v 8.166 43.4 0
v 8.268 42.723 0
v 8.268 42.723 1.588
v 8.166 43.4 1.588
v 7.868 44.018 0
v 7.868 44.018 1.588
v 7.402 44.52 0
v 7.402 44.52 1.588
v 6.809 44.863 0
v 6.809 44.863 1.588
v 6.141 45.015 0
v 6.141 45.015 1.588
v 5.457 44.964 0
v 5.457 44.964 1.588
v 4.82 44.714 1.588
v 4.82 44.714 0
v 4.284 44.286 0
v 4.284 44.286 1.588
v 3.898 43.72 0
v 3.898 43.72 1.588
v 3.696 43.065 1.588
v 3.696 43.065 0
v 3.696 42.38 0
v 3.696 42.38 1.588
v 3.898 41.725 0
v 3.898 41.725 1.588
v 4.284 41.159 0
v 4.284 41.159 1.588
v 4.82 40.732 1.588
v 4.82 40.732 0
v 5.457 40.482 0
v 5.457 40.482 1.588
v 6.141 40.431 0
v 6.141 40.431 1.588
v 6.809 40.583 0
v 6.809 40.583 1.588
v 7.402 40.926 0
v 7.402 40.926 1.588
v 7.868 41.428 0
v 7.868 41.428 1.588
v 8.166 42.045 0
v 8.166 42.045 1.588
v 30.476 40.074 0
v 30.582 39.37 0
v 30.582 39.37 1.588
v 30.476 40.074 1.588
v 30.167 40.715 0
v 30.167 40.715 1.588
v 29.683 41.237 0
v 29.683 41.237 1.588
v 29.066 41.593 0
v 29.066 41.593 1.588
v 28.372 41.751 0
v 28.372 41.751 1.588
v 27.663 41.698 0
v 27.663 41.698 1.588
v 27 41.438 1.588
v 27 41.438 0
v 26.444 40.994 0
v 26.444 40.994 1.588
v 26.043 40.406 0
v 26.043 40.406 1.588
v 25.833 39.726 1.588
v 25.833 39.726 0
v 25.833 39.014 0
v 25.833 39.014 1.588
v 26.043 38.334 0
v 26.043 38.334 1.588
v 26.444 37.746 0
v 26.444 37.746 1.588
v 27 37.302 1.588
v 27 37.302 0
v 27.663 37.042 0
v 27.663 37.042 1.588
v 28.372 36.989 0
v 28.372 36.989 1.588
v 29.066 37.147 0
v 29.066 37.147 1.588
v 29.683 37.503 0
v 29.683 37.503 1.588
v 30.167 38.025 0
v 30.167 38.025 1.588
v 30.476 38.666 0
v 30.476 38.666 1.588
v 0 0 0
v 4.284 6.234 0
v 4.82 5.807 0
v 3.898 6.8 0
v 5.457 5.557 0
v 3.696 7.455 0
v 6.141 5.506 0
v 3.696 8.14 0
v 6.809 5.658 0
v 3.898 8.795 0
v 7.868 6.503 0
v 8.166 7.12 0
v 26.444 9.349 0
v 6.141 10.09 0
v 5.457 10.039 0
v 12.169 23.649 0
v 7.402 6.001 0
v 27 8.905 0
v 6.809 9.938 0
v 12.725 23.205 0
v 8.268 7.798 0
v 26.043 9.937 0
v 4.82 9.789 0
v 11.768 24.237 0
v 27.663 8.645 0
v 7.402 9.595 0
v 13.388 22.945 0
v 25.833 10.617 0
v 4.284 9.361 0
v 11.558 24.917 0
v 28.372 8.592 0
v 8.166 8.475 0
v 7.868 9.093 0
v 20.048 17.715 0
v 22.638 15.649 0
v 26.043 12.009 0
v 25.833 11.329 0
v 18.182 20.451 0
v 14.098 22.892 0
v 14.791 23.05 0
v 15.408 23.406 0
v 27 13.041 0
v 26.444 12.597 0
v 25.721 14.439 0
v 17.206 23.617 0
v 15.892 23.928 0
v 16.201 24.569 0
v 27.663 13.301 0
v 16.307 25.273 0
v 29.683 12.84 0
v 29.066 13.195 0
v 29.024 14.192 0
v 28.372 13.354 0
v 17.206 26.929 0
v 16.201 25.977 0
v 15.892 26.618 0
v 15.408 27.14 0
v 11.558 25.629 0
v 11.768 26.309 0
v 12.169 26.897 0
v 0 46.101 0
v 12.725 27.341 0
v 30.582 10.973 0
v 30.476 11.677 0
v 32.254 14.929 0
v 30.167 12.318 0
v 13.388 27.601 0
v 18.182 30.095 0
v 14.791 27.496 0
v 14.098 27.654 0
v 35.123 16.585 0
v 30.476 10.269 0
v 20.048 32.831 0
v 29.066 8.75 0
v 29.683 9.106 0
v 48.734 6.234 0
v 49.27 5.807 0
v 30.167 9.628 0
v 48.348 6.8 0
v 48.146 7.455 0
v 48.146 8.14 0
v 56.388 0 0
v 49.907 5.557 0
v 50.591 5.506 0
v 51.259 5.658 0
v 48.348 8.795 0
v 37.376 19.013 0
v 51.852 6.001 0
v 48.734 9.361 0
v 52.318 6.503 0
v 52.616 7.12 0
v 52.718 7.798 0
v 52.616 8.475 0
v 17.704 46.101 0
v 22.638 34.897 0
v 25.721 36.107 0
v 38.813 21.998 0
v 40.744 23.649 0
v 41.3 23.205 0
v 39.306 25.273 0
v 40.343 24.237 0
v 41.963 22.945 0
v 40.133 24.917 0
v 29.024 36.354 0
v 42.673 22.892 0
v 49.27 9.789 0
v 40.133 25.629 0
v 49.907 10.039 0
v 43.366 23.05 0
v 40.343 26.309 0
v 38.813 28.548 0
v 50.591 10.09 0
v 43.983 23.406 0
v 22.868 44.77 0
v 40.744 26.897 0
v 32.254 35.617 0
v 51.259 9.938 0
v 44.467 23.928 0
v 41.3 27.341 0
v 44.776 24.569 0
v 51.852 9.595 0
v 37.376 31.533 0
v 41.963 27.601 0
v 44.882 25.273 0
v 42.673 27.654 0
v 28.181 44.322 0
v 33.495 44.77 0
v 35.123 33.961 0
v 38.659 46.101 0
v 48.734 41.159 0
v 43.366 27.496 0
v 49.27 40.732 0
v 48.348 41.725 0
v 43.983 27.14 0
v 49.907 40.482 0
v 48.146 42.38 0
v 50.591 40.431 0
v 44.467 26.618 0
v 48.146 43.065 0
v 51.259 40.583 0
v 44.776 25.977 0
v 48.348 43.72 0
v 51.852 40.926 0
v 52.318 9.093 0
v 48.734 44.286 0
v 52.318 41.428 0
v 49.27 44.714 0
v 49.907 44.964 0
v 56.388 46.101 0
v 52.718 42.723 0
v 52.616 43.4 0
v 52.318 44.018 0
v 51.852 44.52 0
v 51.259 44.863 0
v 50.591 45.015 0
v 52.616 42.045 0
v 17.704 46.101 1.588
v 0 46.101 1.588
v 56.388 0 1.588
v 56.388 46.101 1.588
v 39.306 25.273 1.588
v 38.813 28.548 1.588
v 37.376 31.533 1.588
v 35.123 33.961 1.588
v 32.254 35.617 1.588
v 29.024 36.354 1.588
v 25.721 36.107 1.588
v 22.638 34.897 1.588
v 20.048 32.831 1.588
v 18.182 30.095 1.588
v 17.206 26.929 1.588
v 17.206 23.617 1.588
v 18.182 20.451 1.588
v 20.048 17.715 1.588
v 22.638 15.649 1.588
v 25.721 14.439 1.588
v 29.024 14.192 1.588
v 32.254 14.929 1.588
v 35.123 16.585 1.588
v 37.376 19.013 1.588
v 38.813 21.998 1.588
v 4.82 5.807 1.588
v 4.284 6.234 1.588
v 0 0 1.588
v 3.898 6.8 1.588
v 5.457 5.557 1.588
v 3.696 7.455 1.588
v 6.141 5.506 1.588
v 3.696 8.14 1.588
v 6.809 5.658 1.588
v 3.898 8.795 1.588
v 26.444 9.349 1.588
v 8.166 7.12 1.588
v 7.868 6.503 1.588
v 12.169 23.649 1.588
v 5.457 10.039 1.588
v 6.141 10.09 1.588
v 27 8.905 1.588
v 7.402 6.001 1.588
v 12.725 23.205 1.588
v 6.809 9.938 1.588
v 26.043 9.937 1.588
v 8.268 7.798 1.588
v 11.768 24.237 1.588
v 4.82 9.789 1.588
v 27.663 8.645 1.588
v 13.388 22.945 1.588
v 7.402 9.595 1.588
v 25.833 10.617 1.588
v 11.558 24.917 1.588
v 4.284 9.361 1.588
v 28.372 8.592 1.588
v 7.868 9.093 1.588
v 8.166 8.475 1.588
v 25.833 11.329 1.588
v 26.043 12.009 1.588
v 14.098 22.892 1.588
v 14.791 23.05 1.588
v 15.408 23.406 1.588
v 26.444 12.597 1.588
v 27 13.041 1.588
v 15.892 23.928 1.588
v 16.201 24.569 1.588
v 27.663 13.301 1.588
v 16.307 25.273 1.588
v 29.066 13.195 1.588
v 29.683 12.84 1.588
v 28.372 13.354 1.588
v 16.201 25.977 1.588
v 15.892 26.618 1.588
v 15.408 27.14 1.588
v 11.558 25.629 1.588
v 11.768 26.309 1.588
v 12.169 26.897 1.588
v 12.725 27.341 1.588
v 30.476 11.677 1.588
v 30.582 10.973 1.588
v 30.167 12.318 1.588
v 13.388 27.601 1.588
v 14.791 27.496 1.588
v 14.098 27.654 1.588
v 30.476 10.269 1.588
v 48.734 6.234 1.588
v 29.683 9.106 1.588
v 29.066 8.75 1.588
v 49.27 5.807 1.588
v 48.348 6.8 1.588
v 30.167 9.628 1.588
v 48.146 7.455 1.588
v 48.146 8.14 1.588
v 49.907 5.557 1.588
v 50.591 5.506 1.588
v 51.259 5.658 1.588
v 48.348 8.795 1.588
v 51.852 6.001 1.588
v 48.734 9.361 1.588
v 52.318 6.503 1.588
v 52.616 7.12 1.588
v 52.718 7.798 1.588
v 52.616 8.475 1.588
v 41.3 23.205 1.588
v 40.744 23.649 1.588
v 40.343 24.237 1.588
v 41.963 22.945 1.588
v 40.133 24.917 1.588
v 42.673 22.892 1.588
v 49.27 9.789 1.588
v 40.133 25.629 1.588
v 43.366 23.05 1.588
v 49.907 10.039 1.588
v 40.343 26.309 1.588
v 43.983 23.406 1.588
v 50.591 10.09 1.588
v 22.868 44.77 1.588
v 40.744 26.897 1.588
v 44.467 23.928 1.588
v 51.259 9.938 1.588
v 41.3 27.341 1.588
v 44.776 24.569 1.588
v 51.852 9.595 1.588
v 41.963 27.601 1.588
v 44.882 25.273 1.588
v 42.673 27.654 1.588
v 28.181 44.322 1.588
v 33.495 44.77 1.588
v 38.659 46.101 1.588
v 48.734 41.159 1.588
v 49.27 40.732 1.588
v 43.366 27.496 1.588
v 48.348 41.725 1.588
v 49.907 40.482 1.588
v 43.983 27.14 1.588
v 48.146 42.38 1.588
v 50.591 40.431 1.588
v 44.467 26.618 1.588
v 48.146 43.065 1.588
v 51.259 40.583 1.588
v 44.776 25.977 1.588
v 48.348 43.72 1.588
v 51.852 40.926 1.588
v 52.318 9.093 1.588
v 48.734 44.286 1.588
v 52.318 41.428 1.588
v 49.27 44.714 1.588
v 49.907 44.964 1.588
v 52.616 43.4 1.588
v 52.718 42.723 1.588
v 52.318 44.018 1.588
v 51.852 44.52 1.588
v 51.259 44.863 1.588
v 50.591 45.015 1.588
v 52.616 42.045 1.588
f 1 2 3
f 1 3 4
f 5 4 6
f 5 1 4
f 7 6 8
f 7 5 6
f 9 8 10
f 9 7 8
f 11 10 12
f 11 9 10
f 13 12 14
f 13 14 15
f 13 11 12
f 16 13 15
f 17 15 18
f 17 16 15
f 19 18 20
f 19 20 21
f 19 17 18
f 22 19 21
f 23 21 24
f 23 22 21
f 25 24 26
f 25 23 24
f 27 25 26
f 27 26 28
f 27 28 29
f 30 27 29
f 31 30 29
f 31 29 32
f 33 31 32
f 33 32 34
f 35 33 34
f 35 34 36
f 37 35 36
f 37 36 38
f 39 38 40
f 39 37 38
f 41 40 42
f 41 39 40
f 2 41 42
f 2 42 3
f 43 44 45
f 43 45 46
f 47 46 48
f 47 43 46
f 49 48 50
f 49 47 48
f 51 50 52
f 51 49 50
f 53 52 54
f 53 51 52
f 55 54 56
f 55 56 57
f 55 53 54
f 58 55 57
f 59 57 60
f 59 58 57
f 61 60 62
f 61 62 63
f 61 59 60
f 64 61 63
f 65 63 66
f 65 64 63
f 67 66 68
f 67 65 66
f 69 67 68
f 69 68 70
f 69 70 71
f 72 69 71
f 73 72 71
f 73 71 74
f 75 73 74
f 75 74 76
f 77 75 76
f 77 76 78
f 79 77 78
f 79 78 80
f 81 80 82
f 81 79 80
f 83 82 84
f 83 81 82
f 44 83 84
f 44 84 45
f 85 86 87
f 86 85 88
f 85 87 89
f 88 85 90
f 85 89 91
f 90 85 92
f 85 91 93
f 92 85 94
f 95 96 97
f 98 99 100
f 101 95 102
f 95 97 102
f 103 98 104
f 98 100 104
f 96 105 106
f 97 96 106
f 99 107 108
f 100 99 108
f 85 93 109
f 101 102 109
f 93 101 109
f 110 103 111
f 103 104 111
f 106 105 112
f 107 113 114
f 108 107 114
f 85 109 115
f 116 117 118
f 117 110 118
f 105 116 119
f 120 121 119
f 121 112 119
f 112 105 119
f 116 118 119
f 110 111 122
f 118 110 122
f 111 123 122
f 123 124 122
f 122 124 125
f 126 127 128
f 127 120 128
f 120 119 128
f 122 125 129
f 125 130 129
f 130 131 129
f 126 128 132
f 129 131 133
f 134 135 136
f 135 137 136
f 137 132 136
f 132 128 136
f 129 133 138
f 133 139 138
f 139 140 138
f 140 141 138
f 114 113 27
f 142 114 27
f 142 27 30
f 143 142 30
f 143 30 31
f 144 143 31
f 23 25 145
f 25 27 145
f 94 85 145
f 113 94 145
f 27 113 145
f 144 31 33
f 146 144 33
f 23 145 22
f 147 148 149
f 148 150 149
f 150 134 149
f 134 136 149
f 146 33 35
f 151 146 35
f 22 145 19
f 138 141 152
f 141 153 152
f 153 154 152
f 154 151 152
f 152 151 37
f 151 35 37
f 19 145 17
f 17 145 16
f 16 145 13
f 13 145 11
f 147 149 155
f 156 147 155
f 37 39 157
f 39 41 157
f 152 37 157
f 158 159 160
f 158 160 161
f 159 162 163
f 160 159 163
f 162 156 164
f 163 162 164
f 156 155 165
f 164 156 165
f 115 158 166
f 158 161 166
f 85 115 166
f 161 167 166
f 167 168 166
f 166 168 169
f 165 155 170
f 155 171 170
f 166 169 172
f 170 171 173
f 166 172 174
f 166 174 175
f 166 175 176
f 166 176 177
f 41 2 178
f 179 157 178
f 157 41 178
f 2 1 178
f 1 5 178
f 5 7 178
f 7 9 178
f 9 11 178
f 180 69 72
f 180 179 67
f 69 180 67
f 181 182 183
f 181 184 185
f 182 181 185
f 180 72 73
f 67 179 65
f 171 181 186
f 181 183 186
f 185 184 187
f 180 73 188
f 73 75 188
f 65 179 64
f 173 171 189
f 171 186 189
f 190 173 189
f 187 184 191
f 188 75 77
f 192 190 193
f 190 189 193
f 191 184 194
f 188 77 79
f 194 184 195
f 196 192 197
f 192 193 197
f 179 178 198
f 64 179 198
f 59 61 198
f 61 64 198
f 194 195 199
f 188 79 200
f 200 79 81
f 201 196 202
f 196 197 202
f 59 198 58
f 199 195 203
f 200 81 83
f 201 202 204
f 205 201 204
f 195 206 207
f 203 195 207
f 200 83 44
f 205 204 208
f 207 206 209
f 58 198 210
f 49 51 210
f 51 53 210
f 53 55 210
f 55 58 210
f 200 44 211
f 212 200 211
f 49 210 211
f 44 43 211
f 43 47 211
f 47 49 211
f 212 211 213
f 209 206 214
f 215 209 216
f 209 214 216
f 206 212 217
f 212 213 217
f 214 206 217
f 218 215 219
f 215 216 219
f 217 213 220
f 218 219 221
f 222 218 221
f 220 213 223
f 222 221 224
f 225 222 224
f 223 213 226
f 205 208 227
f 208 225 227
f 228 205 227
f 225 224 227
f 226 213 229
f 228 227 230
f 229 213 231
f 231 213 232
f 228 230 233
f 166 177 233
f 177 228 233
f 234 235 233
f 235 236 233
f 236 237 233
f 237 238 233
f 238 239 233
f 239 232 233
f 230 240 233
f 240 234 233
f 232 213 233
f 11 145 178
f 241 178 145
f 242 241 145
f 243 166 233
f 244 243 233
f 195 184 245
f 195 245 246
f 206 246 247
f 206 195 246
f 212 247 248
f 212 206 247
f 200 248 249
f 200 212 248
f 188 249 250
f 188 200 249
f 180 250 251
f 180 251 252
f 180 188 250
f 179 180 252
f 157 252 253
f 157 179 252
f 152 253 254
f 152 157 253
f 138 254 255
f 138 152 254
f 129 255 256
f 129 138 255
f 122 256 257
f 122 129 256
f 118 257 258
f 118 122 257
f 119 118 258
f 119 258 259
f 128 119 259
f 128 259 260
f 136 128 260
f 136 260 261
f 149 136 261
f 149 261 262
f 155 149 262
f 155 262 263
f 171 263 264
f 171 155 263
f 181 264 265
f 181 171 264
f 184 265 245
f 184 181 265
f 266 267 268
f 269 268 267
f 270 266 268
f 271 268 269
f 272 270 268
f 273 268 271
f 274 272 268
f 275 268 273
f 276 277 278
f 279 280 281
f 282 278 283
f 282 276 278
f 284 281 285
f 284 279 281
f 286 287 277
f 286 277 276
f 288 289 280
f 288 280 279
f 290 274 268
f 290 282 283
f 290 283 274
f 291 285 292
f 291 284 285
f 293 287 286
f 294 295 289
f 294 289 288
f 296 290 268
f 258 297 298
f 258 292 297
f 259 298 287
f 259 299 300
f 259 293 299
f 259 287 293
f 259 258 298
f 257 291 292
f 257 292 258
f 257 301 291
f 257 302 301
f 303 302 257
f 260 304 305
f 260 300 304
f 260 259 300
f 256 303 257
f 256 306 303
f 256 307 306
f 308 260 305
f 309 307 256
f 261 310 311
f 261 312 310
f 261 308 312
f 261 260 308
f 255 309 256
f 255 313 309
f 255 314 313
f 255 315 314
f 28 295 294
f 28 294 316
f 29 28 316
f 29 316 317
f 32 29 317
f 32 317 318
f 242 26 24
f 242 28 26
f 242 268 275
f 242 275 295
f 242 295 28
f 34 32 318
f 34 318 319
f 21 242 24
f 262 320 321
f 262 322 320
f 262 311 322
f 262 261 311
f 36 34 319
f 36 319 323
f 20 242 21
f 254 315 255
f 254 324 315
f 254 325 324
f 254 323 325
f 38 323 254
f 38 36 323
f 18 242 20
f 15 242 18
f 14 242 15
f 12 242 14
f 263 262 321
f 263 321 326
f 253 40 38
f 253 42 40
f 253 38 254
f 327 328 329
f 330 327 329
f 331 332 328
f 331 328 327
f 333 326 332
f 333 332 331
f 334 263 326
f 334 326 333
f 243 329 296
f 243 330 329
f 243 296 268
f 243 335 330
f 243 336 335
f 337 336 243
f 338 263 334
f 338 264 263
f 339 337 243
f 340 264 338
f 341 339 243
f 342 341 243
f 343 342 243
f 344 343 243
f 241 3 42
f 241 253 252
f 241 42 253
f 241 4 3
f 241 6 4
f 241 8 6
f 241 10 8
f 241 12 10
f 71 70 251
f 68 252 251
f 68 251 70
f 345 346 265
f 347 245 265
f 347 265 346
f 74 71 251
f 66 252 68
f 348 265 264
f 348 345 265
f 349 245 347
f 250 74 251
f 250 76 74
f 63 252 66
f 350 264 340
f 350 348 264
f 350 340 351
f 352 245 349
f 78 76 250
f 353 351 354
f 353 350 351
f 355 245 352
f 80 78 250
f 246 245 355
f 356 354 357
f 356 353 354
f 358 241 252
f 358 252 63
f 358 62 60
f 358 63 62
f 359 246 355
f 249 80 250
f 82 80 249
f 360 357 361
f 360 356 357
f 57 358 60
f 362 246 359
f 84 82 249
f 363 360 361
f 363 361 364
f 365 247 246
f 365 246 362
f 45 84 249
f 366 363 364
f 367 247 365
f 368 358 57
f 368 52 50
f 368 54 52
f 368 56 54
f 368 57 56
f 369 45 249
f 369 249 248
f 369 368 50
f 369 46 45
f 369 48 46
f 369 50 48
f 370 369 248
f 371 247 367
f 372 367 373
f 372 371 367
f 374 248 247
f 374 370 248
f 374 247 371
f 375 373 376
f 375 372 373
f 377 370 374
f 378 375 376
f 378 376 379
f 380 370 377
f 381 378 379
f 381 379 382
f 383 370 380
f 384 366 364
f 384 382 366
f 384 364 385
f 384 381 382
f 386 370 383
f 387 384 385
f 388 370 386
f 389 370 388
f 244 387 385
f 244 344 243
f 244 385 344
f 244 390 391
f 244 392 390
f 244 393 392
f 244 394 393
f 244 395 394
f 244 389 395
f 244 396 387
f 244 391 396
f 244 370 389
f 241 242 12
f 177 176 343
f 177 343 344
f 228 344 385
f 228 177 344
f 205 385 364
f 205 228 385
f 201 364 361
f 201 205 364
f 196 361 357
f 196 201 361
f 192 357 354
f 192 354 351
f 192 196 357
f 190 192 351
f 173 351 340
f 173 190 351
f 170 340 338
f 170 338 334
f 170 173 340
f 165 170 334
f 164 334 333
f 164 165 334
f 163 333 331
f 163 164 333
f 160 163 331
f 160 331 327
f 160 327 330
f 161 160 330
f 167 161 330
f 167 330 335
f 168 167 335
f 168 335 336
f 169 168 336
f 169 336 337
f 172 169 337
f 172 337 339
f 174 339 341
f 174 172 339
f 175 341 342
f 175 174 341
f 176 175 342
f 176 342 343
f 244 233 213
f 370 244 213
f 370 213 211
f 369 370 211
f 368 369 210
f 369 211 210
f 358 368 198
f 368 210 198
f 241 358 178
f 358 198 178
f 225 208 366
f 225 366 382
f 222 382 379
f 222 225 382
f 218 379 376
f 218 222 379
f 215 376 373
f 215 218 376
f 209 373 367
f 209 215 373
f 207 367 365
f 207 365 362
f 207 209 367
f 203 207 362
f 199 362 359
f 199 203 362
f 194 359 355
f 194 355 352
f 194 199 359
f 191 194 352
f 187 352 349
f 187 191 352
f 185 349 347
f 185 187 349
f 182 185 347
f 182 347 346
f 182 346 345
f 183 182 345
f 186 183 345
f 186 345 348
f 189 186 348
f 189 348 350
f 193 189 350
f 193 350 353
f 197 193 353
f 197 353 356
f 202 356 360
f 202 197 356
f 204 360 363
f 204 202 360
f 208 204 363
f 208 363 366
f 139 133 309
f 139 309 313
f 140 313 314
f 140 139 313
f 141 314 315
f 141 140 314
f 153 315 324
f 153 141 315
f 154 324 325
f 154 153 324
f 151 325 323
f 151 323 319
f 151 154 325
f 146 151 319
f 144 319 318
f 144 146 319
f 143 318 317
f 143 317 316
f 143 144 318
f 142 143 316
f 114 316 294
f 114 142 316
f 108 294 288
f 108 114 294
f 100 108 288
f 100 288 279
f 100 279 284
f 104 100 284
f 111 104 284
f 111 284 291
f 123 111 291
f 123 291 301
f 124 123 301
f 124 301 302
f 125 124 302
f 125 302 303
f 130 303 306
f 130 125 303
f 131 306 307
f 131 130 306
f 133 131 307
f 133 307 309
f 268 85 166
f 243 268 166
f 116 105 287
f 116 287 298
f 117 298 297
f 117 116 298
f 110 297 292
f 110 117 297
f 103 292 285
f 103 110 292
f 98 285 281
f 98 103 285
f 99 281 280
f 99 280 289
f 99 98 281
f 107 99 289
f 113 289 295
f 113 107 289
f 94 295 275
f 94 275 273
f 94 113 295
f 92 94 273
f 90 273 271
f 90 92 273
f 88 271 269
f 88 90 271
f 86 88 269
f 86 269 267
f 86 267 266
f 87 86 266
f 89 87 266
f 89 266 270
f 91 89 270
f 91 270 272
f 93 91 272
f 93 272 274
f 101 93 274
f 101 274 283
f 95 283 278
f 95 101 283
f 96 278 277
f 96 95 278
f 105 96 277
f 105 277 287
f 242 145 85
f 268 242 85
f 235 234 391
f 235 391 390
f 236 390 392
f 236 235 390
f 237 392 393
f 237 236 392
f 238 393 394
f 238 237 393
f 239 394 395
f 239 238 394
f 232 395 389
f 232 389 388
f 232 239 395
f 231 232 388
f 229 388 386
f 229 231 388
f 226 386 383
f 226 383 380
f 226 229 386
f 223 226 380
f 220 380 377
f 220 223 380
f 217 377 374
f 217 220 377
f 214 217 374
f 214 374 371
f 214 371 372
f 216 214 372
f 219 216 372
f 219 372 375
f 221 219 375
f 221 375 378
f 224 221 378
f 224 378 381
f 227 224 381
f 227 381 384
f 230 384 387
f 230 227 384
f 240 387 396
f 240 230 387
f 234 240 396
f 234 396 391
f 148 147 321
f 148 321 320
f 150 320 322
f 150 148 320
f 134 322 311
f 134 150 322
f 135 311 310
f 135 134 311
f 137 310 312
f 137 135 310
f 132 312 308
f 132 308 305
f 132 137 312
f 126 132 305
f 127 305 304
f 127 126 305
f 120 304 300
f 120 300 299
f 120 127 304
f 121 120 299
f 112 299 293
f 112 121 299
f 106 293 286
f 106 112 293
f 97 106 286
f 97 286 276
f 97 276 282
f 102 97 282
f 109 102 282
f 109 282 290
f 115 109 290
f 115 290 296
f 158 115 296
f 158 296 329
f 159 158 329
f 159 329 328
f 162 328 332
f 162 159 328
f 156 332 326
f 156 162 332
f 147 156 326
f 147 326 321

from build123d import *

# Parameters (mm, degrees)
F0_R     = 2.2987
F0_R_2   = 2.3876
F0_R_3   = 11.1125
F1_DEPTH = 1.5875


with BuildPart() as f1:
    # F0 (on Top) → F1 (new body)
    with BuildSketch(Plane.XY):
        with BuildLine():
            Line((0, 46.101), (0, 0))
            Line((0, 0), (56.388, 0))
            Line((56.388, 0), (56.388, 46.101))
            Line((56.388, 46.101), (38.6588, 46.101))
            ThreePointArc((38.6588, 46.101), (28.1813, 44.322395), (17.7038, 46.101))
            Line((17.7038, 46.101), (0, 46.101))
        make_face()
        with Locations((5.969, 7.7978)):
            Circle(F0_R, mode=Mode.SUBTRACT)
        with Locations((28.194, 10.9728)):
            Circle(F0_R_2, mode=Mode.SUBTRACT)
        with Locations((50.419, 7.7978)):
            Circle(F0_R, mode=Mode.SUBTRACT)
        with Locations((5.969, 42.7228)):
            Circle(F0_R, mode=Mode.SUBTRACT)
        with Locations((13.9192, 25.273)):
            Circle(F0_R_2, mode=Mode.SUBTRACT)
        with Locations((28.194, 25.273)):
            Circle(F0_R_3, mode=Mode.SUBTRACT)
        with Locations((42.4942, 25.273)):
            Circle(F0_R_2, mode=Mode.SUBTRACT)
        with Locations((28.194, 39.37)):
            Circle(F0_R_2, mode=Mode.SUBTRACT)
        with Locations((50.419, 42.7228)):
            Circle(F0_R, mode=Mode.SUBTRACT)
    extrude(amount=F1_DEPTH)


solid = f1.part
